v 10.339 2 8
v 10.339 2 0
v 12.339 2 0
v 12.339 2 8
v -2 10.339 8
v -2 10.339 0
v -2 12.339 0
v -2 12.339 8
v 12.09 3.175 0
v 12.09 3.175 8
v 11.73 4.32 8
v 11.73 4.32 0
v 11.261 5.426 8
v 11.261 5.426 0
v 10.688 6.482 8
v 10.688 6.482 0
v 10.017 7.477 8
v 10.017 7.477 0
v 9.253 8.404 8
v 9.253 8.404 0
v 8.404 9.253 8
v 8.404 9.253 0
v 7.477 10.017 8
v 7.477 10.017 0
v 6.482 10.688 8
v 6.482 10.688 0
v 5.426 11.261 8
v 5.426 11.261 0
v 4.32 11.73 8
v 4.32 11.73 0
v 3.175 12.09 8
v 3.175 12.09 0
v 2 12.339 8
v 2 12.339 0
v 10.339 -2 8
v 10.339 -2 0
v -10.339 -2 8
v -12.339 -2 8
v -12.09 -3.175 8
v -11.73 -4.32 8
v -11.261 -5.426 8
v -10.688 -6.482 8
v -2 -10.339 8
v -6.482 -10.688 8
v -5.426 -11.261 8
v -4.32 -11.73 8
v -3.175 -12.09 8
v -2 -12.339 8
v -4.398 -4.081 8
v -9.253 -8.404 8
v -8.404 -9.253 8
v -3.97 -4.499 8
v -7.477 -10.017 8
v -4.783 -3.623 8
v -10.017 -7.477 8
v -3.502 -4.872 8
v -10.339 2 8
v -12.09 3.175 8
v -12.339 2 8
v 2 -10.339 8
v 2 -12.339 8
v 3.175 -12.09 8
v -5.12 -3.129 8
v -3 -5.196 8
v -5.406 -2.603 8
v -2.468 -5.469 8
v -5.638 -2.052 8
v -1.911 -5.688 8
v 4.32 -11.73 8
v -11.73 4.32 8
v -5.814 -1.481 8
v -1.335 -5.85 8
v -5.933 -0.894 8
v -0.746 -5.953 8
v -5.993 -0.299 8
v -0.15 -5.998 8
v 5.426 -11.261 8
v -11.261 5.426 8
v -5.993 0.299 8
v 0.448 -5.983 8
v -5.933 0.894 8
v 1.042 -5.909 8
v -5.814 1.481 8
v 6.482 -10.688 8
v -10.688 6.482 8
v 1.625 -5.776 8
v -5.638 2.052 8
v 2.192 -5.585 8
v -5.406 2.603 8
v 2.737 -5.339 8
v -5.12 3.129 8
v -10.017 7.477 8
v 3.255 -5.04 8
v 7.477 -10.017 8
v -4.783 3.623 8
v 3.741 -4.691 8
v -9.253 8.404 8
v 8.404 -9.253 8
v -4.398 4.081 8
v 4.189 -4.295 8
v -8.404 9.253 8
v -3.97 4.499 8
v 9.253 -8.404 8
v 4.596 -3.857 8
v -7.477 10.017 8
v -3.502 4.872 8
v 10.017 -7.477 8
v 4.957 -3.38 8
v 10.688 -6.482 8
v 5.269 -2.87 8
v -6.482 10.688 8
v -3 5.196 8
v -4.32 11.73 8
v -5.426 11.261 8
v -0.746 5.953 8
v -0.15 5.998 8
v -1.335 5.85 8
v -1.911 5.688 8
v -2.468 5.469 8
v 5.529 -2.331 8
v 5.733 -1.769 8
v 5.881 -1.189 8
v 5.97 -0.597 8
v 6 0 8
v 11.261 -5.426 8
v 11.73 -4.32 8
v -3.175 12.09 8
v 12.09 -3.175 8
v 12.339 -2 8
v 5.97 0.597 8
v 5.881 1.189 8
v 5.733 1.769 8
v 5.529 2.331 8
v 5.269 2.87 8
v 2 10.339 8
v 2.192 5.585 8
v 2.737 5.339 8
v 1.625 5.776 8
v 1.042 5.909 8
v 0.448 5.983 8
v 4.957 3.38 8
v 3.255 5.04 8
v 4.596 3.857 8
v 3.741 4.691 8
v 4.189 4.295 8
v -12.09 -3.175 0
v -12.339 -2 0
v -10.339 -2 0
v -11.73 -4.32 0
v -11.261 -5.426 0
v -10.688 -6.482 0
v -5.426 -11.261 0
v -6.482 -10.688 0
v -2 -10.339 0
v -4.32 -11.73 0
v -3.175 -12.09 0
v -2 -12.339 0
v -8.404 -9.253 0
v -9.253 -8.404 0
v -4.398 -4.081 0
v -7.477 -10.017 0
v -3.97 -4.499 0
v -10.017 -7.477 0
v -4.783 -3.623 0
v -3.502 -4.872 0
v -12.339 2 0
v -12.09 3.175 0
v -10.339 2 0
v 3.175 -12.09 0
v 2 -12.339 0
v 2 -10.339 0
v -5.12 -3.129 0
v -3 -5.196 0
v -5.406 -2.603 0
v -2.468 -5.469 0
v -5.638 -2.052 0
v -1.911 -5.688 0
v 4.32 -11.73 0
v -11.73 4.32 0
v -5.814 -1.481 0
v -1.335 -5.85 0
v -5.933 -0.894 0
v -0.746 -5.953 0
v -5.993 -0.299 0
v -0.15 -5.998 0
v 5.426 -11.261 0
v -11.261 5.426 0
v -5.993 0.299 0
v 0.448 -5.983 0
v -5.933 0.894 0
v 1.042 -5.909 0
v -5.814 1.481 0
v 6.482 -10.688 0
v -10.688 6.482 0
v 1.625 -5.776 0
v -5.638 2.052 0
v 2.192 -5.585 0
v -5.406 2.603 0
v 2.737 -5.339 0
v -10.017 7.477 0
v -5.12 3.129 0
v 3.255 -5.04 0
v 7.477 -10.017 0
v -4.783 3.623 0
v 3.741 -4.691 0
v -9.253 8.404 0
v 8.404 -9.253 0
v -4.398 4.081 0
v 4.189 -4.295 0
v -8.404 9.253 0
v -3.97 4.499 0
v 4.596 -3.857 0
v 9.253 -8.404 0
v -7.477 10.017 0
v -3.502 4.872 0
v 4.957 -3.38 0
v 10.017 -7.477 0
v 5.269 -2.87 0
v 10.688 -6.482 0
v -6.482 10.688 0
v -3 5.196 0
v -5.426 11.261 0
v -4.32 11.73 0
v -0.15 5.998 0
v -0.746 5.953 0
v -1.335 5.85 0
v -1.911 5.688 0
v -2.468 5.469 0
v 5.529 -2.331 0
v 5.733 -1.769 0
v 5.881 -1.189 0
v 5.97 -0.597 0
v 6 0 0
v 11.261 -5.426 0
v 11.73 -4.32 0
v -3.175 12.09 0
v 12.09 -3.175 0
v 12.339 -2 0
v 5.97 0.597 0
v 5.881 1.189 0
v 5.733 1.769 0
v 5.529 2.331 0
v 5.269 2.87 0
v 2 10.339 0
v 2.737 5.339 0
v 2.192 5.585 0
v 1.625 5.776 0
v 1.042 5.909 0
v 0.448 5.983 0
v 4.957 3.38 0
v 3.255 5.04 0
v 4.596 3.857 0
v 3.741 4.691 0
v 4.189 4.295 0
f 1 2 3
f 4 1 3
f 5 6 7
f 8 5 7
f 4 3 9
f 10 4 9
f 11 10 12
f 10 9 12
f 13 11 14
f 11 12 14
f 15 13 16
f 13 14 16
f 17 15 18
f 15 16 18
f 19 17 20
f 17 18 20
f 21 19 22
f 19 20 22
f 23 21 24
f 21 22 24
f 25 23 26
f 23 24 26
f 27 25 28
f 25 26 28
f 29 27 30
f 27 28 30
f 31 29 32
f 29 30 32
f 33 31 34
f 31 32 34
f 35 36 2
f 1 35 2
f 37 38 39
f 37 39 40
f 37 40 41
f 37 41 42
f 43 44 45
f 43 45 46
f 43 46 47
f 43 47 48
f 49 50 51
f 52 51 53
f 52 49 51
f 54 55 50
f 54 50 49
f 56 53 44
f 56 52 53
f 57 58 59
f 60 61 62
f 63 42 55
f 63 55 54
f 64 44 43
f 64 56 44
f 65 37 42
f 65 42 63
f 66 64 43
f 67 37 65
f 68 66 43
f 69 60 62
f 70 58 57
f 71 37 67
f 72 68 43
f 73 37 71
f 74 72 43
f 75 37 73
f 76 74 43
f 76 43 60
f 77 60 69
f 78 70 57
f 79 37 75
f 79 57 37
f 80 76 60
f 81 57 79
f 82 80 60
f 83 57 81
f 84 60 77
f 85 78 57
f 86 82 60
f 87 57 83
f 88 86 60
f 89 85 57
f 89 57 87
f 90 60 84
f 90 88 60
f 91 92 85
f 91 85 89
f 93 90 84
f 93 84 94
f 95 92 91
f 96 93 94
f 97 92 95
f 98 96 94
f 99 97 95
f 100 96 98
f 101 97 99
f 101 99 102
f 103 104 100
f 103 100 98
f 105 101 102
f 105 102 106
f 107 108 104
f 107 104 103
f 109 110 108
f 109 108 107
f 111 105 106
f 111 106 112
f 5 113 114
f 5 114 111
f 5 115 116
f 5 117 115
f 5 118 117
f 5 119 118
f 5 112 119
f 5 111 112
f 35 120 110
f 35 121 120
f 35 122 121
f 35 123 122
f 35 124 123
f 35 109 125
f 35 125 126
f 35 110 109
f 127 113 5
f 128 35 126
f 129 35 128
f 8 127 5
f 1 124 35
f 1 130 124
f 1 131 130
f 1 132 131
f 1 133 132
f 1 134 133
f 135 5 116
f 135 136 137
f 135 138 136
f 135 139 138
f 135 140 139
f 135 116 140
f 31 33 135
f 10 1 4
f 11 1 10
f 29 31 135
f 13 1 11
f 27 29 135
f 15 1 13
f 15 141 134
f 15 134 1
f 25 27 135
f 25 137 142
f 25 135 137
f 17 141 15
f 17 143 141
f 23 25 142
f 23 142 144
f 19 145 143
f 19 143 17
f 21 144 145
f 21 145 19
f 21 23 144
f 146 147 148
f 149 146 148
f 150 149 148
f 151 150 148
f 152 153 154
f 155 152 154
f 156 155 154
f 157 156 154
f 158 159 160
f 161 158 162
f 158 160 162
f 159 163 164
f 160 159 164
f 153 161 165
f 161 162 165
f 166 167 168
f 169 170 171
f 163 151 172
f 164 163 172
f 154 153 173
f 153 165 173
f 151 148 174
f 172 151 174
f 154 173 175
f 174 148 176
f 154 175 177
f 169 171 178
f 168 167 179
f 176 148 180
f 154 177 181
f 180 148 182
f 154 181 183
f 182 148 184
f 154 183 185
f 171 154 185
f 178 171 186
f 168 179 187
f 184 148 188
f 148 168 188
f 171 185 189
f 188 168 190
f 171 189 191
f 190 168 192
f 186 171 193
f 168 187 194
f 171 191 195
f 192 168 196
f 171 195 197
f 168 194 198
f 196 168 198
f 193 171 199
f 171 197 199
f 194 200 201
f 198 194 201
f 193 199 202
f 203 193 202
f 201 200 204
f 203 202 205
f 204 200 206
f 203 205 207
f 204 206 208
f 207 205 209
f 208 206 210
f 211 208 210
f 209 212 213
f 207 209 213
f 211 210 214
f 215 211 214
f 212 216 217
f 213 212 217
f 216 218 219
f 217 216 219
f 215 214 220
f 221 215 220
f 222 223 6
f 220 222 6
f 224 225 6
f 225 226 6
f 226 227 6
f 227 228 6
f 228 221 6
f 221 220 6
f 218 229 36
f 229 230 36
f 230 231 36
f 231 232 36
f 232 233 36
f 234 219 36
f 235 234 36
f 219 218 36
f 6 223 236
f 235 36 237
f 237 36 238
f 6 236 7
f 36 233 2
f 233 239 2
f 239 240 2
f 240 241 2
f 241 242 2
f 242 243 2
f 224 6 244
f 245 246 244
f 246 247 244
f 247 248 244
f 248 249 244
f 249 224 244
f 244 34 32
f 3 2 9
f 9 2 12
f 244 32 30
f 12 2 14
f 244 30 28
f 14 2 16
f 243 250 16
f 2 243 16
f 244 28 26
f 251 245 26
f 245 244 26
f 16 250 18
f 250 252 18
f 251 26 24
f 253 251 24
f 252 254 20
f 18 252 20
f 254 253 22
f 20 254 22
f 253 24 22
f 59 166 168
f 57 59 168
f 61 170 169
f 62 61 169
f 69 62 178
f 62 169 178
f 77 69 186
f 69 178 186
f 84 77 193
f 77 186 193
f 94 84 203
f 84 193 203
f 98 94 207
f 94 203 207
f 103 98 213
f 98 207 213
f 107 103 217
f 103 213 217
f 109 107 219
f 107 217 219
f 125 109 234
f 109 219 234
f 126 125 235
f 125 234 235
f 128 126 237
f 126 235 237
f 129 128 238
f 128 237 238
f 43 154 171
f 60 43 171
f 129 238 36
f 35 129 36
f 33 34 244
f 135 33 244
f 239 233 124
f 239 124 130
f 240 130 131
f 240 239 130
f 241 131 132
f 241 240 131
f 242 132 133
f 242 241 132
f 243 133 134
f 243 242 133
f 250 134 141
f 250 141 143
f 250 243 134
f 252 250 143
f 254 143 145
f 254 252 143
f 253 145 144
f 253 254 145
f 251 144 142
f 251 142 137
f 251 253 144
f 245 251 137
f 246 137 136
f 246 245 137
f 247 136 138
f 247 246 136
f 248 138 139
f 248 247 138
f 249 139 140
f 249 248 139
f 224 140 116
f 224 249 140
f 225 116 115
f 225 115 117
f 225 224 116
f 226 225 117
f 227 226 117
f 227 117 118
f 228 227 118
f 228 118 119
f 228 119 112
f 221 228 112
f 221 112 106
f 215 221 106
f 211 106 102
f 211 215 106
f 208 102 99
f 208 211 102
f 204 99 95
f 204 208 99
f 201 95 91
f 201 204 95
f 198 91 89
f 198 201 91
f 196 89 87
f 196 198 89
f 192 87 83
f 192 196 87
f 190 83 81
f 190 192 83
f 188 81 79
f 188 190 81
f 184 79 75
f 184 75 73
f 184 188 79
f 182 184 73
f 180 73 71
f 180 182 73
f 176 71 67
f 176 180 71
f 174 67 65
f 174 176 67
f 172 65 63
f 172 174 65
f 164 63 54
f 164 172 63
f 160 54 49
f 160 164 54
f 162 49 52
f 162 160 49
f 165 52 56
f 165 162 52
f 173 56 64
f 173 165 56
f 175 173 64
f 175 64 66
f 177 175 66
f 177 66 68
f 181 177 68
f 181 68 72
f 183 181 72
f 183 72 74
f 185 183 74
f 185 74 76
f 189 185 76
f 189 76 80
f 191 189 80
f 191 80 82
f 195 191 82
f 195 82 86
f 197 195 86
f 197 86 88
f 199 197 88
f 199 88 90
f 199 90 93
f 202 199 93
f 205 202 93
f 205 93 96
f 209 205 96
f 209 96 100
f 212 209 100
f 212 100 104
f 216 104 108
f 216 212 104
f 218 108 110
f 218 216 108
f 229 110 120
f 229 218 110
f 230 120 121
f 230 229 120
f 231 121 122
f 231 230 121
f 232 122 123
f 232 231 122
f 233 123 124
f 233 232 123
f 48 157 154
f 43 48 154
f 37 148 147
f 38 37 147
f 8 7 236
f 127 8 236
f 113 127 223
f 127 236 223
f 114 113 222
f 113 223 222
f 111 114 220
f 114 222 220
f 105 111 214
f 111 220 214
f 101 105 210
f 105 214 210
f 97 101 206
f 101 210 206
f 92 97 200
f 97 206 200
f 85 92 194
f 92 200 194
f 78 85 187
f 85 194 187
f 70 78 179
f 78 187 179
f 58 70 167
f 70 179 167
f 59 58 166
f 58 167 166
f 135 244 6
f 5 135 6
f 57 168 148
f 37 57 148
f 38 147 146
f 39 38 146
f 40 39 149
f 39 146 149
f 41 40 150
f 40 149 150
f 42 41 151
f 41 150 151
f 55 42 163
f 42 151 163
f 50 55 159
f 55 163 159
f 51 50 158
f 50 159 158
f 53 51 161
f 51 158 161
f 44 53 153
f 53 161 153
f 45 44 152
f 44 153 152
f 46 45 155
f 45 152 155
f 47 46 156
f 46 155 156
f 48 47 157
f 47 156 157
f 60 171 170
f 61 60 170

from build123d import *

# Parameters (mm, degrees)
ESBO_O1_R                = 6
RESSALTO_EXTRUS_O1_DEPTH = 8


with BuildPart() as part:
    # Esboço1 → Ressalto-extrusão1 (new body)
    with BuildSketch(Plane.XY):
        with BuildLine():
            Line((2, 10.338962679), (-2, 10.338962679))
            Line((-2, 10.338962679), (-2, 12.338962679))
            ThreePointArc((-2, 12.338962679), (-8.838834765, 8.838834765), (-12.338962679, 2))
            Line((-12.338962679, 2), (-10.338962679, 2))
            Line((-10.338962679, 2), (-10.338962679, -2))
            Line((-10.338962679, -2), (-12.338962679, -2))
            ThreePointArc((-12.338962679, -2), (-8.838834765, -8.838834765), (-2, -12.338962679))
            Line((-2, -12.338962679), (-2, -10.338962679))
            Line((-2, -10.338962679), (2, -10.338962679))
            Line((2, -10.338962679), (2, -12.338962679))
            ThreePointArc((2, -12.338962679), (8.838834765, -8.838834765), (12.338962679, -2))
            Line((12.338962679, -2), (10.338962679, -2))
            Line((10.338962679, -2), (10.338962679, 2))
            Line((10.338962679, 2), (12.338962679, 2))
            ThreePointArc((12.338962679, 2), (8.838834765, 8.838834765), (2, 12.338962679))
            Line((2, 12.338962679), (2, 10.338962679))
        make_face()
        Circle(ESBO_O1_R, mode=Mode.SUBTRACT)
    extrude(amount=RESSALTO_EXTRUS_O1_DEPTH)


solid = part.part
